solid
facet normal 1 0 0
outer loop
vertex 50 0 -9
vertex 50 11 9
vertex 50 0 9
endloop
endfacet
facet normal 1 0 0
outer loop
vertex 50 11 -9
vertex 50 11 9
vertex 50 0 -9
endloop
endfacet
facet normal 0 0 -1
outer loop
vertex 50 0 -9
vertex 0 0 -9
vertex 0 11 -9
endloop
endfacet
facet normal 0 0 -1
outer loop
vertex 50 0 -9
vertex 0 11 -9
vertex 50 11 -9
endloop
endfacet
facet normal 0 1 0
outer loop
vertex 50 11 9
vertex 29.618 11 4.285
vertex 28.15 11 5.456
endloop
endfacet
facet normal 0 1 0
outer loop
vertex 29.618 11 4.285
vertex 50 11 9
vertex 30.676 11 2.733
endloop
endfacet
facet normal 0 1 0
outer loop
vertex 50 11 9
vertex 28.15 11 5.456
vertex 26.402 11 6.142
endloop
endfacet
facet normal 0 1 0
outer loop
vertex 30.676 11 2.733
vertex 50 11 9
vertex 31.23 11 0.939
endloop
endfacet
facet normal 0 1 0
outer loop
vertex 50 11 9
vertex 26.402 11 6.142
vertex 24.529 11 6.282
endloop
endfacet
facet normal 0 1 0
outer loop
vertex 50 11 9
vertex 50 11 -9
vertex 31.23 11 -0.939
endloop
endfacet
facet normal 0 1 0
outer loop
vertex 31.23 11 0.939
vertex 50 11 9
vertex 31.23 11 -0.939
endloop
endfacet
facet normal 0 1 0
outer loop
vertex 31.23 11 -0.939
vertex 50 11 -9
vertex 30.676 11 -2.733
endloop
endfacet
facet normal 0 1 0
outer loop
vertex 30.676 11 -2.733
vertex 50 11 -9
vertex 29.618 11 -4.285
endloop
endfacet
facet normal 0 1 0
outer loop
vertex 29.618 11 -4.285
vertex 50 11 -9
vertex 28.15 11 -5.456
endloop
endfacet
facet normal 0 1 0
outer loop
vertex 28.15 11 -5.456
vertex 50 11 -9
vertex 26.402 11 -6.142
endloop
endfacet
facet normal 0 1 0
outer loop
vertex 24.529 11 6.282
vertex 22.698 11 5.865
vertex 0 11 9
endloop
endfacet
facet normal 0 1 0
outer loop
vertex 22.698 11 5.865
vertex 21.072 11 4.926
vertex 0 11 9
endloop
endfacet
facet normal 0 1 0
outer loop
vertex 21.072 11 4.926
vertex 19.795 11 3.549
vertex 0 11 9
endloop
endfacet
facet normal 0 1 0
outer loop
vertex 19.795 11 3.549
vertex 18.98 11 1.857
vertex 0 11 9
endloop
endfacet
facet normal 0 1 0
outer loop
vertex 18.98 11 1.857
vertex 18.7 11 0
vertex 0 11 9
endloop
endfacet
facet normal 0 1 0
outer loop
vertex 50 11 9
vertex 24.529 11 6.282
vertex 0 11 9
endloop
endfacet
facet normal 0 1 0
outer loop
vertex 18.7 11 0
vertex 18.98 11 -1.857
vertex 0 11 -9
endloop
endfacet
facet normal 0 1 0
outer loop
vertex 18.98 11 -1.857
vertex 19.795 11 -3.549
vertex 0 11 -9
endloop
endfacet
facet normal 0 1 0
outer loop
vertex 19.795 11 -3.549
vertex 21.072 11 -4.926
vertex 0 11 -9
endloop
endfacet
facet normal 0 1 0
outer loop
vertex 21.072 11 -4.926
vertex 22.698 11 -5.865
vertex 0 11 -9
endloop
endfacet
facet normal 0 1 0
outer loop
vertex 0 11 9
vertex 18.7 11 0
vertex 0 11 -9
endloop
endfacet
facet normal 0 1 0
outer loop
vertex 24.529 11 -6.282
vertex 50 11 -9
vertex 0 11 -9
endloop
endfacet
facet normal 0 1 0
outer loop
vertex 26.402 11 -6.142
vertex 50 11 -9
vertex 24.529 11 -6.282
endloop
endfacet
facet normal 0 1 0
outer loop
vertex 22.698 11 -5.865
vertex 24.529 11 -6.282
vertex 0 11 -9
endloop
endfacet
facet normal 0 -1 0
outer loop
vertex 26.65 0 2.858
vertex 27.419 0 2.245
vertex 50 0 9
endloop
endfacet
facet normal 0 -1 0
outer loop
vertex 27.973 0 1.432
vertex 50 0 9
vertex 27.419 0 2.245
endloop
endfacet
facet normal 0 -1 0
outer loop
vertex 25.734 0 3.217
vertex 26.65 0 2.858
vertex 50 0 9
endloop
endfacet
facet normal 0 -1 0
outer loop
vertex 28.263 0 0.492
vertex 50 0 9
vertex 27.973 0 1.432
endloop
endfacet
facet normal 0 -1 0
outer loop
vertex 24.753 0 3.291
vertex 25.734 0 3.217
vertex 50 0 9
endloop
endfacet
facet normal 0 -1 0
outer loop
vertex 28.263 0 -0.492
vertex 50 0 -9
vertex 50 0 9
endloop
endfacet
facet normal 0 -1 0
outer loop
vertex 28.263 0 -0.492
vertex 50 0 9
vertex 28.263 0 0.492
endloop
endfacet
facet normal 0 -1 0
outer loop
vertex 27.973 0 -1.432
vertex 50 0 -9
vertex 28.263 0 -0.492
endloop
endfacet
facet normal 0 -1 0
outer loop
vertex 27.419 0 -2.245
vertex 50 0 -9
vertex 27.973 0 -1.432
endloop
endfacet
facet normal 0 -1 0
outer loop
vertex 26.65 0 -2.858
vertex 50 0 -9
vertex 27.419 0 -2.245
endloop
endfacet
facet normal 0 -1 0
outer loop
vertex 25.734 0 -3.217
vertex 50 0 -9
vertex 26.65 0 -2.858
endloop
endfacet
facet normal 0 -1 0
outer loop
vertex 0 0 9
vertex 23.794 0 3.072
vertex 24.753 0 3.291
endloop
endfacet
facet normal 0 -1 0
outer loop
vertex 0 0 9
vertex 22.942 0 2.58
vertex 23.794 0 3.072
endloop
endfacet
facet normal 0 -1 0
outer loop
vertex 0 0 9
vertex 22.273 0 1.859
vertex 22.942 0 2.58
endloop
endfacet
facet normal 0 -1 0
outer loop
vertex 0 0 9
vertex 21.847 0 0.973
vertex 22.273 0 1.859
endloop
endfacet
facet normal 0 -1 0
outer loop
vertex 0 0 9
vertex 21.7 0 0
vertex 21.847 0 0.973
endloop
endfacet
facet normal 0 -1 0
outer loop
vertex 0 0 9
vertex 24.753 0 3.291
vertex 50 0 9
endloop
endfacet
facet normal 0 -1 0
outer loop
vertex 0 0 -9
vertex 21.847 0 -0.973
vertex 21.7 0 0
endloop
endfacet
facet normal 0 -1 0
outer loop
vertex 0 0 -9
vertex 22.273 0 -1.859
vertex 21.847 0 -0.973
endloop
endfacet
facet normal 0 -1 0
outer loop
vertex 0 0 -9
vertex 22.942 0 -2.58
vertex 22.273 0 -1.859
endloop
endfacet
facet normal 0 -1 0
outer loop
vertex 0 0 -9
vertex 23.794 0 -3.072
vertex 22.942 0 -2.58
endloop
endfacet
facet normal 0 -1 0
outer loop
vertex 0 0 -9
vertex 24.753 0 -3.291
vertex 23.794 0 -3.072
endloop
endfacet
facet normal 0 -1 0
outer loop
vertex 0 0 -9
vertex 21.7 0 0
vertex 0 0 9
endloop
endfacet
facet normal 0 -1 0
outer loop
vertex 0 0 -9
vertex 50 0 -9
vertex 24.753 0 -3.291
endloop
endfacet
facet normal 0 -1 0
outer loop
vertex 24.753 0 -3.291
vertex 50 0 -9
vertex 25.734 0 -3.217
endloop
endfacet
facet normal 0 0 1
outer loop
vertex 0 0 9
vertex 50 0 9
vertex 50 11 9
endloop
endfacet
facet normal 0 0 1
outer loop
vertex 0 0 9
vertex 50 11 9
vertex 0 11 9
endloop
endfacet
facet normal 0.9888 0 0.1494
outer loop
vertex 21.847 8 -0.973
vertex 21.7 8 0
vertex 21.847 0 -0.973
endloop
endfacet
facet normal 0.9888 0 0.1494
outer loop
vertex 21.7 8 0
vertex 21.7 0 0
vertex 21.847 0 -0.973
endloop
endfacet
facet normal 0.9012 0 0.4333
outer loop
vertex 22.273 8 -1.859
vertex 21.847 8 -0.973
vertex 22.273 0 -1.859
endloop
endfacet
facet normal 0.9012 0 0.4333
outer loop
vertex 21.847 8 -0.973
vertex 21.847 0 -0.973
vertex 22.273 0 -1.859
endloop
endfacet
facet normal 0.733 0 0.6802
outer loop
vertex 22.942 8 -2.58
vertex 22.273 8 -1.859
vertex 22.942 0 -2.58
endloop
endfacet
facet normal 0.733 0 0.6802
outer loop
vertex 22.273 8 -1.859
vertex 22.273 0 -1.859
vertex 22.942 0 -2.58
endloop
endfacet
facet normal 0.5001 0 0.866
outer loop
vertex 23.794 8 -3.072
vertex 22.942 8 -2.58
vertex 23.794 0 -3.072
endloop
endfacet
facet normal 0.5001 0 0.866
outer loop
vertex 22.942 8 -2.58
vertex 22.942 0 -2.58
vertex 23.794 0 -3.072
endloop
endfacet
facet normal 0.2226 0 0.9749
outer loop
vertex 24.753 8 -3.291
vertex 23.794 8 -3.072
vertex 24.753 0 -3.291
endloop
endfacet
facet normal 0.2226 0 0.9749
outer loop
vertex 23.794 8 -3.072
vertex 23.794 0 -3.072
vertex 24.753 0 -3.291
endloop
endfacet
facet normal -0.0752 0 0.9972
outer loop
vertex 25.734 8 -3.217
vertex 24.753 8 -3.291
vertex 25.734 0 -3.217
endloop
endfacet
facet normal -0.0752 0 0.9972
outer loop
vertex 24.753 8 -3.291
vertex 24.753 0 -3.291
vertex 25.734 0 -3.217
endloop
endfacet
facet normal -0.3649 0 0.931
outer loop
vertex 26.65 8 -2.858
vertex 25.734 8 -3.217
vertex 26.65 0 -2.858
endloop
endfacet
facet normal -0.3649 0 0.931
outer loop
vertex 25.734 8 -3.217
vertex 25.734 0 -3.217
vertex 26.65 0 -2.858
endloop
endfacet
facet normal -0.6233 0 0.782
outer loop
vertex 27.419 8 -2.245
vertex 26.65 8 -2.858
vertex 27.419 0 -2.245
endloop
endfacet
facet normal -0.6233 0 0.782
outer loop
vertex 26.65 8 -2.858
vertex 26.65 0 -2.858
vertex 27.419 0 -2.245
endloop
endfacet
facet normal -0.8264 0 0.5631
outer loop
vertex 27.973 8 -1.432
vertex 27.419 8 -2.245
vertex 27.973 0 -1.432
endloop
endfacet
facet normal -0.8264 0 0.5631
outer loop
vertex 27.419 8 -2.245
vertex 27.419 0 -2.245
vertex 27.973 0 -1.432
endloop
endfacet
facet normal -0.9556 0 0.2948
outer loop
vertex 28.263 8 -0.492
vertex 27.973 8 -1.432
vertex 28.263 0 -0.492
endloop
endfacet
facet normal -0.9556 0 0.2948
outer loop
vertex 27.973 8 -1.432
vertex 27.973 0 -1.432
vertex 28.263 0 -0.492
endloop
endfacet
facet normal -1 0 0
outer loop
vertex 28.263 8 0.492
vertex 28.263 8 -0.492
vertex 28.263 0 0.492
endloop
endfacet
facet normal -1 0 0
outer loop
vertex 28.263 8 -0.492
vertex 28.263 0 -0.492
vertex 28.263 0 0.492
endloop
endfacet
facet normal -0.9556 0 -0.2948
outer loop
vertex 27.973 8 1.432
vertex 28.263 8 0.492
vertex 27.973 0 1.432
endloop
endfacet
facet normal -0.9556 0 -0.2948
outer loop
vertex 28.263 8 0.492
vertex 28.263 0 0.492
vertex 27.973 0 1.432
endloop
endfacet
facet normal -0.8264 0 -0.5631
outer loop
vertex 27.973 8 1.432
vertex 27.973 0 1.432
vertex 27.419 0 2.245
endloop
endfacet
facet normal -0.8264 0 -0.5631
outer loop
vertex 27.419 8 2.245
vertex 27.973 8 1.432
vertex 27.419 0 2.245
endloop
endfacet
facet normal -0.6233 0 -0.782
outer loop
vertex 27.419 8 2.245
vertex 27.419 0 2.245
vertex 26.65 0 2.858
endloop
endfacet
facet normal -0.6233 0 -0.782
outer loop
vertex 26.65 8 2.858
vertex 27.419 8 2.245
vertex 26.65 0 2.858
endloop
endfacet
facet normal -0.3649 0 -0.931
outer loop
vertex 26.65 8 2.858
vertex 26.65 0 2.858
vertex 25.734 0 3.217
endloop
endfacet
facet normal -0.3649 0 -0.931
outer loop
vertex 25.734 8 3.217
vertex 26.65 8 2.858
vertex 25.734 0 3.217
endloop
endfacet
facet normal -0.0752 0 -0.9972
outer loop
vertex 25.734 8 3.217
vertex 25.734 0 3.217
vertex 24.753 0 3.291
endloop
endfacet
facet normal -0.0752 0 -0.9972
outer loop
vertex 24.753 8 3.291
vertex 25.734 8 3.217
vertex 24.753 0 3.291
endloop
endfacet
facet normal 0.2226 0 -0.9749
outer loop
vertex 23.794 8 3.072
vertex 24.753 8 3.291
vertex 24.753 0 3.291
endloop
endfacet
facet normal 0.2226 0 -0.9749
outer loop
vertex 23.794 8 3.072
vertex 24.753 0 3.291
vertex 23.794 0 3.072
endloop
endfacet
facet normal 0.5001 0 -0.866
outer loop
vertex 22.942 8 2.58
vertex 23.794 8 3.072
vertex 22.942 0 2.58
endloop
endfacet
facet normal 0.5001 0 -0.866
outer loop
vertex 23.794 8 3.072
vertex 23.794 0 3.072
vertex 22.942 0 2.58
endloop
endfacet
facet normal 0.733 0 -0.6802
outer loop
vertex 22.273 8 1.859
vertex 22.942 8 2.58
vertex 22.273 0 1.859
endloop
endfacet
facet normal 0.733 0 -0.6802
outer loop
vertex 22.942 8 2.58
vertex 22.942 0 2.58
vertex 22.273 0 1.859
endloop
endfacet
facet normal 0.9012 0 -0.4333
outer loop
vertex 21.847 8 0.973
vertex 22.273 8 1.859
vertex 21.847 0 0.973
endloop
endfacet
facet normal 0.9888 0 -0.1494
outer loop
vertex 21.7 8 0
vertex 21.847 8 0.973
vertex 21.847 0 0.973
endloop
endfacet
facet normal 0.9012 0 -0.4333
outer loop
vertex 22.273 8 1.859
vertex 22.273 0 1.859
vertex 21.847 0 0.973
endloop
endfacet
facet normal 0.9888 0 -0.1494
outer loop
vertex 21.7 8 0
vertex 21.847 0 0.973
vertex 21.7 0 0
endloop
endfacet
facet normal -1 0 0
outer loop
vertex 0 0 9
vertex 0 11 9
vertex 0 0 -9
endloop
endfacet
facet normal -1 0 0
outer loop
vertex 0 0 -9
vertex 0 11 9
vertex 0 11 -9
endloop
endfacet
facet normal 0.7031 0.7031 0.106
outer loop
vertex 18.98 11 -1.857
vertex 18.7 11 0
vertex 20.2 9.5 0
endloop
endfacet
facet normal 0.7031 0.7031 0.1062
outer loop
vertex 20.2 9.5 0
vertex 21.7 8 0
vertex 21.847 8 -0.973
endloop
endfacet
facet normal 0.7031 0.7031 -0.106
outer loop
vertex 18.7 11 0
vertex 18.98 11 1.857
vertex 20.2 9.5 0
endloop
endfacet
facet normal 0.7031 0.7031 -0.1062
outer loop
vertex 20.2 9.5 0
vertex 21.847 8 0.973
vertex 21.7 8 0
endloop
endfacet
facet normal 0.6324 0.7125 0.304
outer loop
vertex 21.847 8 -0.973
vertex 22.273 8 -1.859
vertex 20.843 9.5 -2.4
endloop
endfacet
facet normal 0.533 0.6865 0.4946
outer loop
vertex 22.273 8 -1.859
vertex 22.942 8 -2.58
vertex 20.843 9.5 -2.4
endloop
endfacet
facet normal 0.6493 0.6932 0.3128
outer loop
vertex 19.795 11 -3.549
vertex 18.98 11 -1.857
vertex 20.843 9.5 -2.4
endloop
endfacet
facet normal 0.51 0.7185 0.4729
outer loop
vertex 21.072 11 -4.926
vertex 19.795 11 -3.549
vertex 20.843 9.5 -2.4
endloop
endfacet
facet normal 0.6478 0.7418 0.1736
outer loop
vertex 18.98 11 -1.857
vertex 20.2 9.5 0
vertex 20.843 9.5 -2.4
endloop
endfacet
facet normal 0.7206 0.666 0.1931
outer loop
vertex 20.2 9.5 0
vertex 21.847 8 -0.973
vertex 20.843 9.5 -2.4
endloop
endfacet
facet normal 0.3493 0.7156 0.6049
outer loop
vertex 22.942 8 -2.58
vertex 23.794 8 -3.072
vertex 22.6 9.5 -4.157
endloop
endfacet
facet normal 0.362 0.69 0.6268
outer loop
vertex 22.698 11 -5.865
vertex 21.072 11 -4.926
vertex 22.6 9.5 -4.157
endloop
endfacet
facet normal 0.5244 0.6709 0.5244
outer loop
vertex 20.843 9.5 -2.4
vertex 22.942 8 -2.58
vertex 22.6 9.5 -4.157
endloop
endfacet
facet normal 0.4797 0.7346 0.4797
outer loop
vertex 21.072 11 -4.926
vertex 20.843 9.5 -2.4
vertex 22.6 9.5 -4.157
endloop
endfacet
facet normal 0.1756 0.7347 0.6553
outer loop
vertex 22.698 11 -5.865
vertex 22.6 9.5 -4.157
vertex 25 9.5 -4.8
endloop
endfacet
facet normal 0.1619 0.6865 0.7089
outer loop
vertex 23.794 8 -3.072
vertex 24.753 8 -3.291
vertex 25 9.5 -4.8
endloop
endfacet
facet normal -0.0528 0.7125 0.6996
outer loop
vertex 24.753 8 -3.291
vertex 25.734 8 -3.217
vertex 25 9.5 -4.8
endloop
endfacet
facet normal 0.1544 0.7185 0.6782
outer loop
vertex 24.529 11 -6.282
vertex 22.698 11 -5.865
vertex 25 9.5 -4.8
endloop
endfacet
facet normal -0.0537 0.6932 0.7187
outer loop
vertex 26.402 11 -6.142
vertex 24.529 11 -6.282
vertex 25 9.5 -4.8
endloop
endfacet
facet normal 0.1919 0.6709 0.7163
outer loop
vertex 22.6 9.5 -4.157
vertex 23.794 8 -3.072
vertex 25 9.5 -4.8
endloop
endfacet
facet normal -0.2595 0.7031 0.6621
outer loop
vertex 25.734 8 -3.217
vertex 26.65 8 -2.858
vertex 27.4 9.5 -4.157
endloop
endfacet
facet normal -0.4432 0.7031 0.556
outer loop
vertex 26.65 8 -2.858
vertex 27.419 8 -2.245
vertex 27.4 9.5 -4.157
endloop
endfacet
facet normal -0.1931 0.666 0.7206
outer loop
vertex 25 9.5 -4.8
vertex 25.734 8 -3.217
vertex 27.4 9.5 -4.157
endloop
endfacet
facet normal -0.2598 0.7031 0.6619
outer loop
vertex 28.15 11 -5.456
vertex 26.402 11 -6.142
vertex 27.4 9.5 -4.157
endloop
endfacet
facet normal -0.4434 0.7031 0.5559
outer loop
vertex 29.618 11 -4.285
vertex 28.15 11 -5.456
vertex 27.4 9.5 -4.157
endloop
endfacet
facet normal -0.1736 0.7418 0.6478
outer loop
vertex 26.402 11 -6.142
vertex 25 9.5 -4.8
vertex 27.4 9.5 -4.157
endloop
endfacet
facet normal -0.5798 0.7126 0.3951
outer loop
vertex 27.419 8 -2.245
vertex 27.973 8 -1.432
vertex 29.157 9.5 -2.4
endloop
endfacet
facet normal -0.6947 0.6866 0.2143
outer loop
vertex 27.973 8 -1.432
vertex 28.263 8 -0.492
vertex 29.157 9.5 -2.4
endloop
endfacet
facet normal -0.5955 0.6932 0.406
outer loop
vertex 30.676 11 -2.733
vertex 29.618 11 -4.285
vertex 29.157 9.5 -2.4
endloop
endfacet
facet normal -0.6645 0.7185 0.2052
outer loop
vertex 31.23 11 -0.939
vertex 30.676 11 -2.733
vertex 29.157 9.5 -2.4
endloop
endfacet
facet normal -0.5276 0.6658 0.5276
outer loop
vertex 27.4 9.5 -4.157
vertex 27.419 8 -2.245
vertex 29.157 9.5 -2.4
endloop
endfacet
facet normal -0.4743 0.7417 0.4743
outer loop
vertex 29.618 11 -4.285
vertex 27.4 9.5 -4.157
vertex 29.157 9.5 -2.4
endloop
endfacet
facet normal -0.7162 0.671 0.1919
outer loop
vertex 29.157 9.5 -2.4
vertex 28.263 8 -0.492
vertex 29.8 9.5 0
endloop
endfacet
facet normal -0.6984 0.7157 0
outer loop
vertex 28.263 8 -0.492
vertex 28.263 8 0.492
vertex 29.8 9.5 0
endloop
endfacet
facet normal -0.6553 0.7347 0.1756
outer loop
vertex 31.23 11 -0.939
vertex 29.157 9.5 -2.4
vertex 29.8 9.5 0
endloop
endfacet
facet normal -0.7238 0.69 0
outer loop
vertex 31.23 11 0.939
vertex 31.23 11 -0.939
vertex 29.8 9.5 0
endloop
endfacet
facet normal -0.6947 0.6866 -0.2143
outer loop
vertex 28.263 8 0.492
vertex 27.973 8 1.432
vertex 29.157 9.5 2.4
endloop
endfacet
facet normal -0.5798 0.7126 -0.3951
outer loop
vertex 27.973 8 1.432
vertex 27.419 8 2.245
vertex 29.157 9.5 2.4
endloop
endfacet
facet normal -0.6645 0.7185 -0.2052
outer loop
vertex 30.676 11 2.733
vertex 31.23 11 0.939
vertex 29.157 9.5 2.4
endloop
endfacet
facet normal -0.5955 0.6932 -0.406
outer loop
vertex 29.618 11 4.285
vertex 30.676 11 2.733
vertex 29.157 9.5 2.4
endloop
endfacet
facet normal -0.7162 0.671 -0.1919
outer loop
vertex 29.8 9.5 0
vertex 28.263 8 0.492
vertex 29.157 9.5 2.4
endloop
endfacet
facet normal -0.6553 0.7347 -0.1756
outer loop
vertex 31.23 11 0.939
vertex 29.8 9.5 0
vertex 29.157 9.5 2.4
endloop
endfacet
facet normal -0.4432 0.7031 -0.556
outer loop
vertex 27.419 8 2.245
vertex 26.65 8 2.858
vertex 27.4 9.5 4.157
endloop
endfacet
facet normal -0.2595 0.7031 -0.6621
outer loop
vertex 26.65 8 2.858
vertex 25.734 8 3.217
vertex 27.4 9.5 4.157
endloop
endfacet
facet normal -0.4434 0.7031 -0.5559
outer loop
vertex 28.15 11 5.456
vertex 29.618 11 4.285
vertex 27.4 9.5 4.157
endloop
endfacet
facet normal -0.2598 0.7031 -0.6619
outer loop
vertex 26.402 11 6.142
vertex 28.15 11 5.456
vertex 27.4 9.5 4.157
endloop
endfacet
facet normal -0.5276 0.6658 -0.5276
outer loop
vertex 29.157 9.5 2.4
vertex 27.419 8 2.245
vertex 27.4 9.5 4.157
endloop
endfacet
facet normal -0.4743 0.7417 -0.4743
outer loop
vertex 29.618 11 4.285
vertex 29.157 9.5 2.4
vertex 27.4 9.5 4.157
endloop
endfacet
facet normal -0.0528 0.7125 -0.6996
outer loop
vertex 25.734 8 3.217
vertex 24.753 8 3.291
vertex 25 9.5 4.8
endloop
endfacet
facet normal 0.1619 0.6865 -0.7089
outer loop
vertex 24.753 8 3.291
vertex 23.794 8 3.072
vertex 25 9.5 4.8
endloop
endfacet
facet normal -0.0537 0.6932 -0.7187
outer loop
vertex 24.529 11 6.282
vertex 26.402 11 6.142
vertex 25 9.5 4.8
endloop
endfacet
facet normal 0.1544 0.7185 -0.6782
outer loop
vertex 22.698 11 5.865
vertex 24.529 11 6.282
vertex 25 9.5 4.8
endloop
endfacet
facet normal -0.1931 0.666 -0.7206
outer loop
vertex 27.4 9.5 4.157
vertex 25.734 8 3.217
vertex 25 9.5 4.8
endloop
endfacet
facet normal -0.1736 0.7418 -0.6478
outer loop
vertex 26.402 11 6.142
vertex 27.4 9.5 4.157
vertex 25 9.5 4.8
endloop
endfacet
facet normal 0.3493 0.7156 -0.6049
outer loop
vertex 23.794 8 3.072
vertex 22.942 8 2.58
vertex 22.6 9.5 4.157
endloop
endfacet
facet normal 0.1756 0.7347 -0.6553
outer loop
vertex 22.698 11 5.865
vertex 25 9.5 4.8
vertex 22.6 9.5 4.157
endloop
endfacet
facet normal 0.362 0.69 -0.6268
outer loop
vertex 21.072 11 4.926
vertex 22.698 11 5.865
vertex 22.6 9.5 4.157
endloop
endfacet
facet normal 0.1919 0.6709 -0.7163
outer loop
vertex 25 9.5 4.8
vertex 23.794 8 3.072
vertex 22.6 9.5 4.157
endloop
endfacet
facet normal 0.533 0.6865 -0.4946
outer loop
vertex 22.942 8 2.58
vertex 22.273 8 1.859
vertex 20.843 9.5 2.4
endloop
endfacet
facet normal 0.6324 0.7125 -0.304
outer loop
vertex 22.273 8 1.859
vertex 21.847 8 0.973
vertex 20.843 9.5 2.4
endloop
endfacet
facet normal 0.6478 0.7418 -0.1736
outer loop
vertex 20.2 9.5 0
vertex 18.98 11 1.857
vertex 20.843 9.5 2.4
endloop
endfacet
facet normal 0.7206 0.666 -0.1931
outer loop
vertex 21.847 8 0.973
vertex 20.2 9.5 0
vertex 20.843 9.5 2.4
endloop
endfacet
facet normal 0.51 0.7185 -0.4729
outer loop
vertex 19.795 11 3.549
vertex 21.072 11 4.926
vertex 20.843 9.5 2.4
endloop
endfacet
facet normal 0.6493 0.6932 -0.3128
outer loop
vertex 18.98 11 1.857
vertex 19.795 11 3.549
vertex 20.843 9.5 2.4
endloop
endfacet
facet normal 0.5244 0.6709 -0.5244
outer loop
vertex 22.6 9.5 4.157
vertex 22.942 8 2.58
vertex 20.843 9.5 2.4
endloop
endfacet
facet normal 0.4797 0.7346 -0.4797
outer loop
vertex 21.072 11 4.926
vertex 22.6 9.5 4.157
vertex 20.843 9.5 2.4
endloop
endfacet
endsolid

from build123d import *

# Parameters (mm, degrees)
BOSS_EXTRUDE1_DEPTH                                 = 11
SKETCH2_W                                           = 10.92366107
SKETCH2_H                                           = 18
SKETCH2_W_2                                         = 14.331152634
CUT_EXTRUDE1_DEPTH                                  = 12
CSK_FOR_M6_COUNTERSUNK_FLAT_HEAD_SCREW1_D           = 6.6
CSK_FOR_M6_COUNTERSUNK_FLAT_HEAD_SCREW1_CSINK_D     = 12.6
CSK_FOR_M6_COUNTERSUNK_FLAT_HEAD_SCREW1_CSINK_ANGLE = 90


with BuildPart() as part:
    # Sketch1 → Boss-Extrude1 (new body)
    with BuildSketch(Plane(origin=(0, 0, 0), x_dir=(1, 0, 0), z_dir=(0, 1, 0))):
        with BuildLine():
            Line((0, 9), (50, 9))
            ThreePointArc((50, 9), (59, 0), (50, -9))
            Line((50, -9), (0, -9))
            ThreePointArc((0, -9), (-9, 0), (0, 9))
        make_face()
    extrude(amount=BOSS_EXTRUDE1_DEPTH)

    # Sketch2 → Cut-Extrude1 (cut, through all)
    with BuildSketch(Plane(origin=(0, 11, 0), x_dir=(1, 0, 0), z_dir=(0, 1, 0))):
        with Locations((-5.461830535, 0)):
            Rectangle(SKETCH2_W, SKETCH2_H)
        with Locations((57.165576317, 0)):
            Rectangle(SKETCH2_W_2, SKETCH2_H)
    extrude(amount=-CUT_EXTRUDE1_DEPTH, mode=Mode.SUBTRACT)

    # CSK for M6 Countersunk Flat Head Screw1 (through all)
    with Locations(Plane(origin=(0, 11, 0), x_dir=(1, 0, 0), z_dir=(0, 1, 0))):
        with Locations((25, 0)):
            CounterSinkHole(CSK_FOR_M6_COUNTERSUNK_FLAT_HEAD_SCREW1_D / 2, CSK_FOR_M6_COUNTERSUNK_FLAT_HEAD_SCREW1_CSINK_D / 2, counter_sink_angle=CSK_FOR_M6_COUNTERSUNK_FLAT_HEAD_SCREW1_CSINK_ANGLE)


solid = part.part
